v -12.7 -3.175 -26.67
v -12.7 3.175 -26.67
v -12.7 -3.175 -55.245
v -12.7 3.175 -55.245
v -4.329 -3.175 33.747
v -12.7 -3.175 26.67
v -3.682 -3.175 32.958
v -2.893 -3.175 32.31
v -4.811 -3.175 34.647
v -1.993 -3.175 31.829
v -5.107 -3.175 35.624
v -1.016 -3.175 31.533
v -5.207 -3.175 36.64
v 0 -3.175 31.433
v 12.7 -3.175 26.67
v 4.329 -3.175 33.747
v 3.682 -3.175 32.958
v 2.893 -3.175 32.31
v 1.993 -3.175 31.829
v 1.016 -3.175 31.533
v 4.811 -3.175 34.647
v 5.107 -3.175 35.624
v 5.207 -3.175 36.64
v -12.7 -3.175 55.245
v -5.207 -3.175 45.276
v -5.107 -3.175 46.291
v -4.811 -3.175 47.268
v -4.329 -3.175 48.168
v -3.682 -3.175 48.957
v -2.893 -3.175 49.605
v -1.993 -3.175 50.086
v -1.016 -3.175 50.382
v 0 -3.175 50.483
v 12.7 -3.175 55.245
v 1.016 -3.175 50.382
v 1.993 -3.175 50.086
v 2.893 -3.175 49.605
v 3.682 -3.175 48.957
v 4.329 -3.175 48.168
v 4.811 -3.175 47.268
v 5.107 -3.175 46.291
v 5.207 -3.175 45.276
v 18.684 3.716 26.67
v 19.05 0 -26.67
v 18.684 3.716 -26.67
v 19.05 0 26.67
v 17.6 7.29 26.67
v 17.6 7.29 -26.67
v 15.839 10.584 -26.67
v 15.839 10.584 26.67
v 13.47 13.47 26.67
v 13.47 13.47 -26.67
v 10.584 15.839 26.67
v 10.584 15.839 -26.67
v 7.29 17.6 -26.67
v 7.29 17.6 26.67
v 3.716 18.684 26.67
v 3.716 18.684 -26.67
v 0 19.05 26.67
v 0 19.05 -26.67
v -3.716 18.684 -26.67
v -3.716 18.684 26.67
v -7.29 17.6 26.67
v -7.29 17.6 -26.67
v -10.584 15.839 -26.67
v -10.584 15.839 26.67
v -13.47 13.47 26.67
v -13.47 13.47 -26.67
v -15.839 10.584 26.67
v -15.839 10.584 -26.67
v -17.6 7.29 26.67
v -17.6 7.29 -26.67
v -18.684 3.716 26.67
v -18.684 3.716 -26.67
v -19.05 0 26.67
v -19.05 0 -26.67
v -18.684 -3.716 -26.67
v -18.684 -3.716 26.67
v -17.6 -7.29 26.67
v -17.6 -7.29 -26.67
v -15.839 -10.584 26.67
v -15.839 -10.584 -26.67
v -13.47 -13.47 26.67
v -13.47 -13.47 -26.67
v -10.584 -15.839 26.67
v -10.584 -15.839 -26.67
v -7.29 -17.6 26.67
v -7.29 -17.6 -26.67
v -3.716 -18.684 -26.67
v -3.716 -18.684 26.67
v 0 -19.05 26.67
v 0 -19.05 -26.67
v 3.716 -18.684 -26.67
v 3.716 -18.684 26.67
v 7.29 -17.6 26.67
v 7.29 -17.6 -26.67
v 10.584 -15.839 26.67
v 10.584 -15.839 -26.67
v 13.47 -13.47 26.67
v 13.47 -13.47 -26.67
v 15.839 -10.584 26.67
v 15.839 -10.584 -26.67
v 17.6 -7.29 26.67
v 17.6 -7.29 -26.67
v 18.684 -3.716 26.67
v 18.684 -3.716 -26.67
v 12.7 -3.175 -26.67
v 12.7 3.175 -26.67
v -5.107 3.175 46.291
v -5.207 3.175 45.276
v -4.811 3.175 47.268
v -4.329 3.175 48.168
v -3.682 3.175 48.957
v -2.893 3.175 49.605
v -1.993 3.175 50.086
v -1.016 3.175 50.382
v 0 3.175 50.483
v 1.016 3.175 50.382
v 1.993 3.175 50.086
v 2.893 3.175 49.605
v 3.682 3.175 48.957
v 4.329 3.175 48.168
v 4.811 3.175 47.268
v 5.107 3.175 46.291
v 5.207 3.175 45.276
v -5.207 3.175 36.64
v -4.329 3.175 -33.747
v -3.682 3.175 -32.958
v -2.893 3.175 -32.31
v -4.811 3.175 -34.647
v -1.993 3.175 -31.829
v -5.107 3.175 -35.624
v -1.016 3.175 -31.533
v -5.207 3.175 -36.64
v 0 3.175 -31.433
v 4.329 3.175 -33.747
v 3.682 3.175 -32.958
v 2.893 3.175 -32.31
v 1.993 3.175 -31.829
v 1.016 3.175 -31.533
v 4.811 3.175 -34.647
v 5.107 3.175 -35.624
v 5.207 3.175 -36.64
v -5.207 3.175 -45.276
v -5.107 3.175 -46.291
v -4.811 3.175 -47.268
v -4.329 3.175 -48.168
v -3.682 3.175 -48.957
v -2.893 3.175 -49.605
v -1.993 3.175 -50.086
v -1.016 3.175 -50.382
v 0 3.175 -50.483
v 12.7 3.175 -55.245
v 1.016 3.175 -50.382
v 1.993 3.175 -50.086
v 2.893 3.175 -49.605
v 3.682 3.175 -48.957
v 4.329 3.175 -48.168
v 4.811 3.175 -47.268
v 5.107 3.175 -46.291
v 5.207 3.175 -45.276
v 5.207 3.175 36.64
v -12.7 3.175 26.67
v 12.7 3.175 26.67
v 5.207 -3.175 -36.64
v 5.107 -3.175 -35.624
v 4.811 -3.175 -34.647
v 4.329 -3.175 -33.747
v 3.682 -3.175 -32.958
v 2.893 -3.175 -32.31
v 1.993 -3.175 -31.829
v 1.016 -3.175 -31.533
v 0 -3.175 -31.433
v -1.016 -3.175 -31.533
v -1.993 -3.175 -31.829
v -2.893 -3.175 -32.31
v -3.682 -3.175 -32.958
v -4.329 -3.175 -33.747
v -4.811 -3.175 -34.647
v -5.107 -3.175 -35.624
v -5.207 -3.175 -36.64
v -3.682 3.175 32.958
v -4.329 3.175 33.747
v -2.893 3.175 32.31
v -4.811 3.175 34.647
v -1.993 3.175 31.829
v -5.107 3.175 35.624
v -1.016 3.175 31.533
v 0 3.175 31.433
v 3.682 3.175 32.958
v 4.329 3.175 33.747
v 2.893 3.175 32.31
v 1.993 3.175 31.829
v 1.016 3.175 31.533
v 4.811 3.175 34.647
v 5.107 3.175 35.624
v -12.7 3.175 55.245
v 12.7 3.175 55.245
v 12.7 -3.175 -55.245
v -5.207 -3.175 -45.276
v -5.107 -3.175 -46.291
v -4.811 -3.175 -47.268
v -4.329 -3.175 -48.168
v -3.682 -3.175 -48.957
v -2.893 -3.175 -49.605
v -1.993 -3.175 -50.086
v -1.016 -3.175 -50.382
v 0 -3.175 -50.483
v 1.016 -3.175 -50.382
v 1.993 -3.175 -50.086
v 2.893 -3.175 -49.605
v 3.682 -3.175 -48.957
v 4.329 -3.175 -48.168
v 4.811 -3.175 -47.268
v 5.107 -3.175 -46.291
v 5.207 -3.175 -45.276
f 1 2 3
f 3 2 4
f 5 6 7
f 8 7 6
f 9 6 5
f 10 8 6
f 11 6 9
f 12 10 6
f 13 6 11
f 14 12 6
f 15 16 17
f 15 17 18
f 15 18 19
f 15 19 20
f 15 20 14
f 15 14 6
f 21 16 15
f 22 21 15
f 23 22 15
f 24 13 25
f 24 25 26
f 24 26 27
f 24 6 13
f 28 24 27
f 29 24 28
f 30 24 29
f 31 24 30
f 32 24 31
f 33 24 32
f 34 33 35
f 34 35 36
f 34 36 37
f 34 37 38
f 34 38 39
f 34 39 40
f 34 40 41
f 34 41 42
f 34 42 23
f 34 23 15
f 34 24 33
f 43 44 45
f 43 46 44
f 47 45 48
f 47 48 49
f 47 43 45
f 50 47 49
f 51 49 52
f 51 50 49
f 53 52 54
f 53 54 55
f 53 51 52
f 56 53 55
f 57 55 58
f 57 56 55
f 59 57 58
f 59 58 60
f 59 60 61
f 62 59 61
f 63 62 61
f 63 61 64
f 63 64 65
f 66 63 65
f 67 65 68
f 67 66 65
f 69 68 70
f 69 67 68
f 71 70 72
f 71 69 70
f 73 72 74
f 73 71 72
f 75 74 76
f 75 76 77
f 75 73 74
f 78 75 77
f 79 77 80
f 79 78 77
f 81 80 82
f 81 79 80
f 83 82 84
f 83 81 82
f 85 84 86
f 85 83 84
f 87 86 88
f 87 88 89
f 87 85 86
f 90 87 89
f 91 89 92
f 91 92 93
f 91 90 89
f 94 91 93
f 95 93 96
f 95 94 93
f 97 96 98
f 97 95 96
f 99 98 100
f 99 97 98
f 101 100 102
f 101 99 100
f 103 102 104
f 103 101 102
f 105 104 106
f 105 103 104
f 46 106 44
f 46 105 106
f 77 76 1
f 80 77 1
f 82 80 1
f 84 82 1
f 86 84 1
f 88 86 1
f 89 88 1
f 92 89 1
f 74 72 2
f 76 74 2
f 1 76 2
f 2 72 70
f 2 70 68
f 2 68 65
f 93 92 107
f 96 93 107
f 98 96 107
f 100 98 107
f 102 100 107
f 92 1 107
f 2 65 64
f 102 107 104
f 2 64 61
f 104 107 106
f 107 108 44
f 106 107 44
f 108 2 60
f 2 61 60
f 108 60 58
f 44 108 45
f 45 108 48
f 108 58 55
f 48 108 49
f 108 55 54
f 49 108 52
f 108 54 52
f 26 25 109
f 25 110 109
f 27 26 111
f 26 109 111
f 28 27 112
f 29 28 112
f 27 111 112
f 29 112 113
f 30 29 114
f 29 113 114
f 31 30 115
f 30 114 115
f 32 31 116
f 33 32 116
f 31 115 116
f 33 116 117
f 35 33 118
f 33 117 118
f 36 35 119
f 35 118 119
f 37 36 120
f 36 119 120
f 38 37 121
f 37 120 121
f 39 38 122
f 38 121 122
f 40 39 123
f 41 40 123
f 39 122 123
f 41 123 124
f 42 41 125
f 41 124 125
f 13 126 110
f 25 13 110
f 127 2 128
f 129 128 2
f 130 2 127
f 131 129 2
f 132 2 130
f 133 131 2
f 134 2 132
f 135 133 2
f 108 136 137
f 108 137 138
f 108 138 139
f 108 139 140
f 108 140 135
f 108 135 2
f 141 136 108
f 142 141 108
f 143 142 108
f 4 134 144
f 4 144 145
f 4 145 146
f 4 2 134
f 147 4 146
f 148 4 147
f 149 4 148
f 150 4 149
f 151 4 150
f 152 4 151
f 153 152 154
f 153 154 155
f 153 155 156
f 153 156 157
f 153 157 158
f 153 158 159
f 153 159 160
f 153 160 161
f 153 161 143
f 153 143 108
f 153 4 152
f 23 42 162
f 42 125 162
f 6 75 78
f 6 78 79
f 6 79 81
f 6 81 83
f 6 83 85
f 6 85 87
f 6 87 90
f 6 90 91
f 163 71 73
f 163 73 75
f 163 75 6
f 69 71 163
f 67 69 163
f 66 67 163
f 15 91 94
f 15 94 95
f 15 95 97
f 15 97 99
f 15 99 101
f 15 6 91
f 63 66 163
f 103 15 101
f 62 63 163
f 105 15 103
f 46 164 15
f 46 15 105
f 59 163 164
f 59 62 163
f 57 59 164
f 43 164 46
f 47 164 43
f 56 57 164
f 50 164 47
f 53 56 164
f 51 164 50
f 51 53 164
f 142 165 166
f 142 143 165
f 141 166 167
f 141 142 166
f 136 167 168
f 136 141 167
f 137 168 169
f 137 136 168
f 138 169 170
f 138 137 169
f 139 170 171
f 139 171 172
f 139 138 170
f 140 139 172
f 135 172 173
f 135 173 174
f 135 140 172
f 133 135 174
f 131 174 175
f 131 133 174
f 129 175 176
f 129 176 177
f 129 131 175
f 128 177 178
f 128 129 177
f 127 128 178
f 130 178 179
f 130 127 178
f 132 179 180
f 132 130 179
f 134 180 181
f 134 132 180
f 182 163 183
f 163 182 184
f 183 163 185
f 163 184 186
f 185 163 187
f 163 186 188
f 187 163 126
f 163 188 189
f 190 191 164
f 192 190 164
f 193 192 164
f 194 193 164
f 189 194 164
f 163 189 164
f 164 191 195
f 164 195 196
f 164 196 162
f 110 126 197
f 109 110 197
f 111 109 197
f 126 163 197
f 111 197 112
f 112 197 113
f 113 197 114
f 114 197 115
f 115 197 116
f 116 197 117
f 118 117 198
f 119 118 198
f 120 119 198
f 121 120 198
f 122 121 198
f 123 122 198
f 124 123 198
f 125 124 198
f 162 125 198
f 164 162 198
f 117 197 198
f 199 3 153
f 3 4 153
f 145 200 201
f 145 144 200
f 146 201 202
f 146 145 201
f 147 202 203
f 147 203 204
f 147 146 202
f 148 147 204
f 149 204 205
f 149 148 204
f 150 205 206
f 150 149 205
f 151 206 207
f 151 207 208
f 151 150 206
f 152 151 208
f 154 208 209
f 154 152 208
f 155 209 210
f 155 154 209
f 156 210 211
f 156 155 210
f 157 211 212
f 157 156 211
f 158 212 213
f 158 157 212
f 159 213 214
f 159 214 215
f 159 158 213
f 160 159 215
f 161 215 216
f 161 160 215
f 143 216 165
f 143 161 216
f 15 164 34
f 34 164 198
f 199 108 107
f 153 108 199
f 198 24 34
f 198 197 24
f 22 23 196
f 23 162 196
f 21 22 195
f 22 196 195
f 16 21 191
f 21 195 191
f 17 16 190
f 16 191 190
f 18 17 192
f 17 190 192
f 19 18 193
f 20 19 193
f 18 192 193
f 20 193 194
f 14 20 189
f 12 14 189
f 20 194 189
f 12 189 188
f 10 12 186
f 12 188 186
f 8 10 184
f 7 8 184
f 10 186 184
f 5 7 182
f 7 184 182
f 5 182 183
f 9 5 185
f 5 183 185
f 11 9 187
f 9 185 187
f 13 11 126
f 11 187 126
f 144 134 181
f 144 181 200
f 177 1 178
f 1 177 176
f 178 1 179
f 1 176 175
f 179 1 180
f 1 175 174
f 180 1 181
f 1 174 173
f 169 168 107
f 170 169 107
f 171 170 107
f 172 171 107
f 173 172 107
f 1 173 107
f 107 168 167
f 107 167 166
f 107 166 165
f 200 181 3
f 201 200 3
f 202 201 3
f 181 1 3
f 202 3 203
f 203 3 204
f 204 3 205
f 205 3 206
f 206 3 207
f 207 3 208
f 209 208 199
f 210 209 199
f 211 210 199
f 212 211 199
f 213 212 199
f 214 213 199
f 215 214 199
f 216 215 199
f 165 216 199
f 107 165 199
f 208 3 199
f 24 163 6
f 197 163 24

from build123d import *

# Parameters (mm, degrees)
FUSE_DEPTH      = 26.67
FUSE_DEPTH_BACK = 26.67
SKETCH1_R       = 19.05
SKETCH2_W       = 25.4
SKETCH2_H       = 28.575
TAB_DEPTH       = 3.175


with BuildPart() as part:
    # Sketch1 → Fuse (new, two sides: drawn at the far end of the back side and taken through both)
    with BuildSketch(Plane.XY.offset(-FUSE_DEPTH_BACK)):
        Circle(SKETCH1_R)
    extrude(amount=FUSE_DEPTH + FUSE_DEPTH_BACK)

    # Sketch2 → Tab (add, symmetric)
    with BuildSketch(Plane(origin=(0, 0, 0), x_dir=(1, 0, 0), z_dir=(0, 1, 0))):
        with Locations((0, 40.9575)):
            Rectangle(SKETCH2_W, SKETCH2_H)
        with BuildLine():
            Line((-5.207, 36.6395), (-5.207, 45.2755))
            ThreePointArc((-5.207, 45.2755), (0, 50.4825), (5.207, 45.2755))
            Line((5.207, 45.2755), (5.207, 36.6395))
            ThreePointArc((5.207, 36.6395), (0, 31.4325), (-5.207, 36.6395))
        make_face(mode=Mode.SUBTRACT)
    tab = extrude(amount=TAB_DEPTH, both=True)

    # Tab Mirror: Tab across plane
    add(tab.mirror(Plane.XY))


solid = part.part
